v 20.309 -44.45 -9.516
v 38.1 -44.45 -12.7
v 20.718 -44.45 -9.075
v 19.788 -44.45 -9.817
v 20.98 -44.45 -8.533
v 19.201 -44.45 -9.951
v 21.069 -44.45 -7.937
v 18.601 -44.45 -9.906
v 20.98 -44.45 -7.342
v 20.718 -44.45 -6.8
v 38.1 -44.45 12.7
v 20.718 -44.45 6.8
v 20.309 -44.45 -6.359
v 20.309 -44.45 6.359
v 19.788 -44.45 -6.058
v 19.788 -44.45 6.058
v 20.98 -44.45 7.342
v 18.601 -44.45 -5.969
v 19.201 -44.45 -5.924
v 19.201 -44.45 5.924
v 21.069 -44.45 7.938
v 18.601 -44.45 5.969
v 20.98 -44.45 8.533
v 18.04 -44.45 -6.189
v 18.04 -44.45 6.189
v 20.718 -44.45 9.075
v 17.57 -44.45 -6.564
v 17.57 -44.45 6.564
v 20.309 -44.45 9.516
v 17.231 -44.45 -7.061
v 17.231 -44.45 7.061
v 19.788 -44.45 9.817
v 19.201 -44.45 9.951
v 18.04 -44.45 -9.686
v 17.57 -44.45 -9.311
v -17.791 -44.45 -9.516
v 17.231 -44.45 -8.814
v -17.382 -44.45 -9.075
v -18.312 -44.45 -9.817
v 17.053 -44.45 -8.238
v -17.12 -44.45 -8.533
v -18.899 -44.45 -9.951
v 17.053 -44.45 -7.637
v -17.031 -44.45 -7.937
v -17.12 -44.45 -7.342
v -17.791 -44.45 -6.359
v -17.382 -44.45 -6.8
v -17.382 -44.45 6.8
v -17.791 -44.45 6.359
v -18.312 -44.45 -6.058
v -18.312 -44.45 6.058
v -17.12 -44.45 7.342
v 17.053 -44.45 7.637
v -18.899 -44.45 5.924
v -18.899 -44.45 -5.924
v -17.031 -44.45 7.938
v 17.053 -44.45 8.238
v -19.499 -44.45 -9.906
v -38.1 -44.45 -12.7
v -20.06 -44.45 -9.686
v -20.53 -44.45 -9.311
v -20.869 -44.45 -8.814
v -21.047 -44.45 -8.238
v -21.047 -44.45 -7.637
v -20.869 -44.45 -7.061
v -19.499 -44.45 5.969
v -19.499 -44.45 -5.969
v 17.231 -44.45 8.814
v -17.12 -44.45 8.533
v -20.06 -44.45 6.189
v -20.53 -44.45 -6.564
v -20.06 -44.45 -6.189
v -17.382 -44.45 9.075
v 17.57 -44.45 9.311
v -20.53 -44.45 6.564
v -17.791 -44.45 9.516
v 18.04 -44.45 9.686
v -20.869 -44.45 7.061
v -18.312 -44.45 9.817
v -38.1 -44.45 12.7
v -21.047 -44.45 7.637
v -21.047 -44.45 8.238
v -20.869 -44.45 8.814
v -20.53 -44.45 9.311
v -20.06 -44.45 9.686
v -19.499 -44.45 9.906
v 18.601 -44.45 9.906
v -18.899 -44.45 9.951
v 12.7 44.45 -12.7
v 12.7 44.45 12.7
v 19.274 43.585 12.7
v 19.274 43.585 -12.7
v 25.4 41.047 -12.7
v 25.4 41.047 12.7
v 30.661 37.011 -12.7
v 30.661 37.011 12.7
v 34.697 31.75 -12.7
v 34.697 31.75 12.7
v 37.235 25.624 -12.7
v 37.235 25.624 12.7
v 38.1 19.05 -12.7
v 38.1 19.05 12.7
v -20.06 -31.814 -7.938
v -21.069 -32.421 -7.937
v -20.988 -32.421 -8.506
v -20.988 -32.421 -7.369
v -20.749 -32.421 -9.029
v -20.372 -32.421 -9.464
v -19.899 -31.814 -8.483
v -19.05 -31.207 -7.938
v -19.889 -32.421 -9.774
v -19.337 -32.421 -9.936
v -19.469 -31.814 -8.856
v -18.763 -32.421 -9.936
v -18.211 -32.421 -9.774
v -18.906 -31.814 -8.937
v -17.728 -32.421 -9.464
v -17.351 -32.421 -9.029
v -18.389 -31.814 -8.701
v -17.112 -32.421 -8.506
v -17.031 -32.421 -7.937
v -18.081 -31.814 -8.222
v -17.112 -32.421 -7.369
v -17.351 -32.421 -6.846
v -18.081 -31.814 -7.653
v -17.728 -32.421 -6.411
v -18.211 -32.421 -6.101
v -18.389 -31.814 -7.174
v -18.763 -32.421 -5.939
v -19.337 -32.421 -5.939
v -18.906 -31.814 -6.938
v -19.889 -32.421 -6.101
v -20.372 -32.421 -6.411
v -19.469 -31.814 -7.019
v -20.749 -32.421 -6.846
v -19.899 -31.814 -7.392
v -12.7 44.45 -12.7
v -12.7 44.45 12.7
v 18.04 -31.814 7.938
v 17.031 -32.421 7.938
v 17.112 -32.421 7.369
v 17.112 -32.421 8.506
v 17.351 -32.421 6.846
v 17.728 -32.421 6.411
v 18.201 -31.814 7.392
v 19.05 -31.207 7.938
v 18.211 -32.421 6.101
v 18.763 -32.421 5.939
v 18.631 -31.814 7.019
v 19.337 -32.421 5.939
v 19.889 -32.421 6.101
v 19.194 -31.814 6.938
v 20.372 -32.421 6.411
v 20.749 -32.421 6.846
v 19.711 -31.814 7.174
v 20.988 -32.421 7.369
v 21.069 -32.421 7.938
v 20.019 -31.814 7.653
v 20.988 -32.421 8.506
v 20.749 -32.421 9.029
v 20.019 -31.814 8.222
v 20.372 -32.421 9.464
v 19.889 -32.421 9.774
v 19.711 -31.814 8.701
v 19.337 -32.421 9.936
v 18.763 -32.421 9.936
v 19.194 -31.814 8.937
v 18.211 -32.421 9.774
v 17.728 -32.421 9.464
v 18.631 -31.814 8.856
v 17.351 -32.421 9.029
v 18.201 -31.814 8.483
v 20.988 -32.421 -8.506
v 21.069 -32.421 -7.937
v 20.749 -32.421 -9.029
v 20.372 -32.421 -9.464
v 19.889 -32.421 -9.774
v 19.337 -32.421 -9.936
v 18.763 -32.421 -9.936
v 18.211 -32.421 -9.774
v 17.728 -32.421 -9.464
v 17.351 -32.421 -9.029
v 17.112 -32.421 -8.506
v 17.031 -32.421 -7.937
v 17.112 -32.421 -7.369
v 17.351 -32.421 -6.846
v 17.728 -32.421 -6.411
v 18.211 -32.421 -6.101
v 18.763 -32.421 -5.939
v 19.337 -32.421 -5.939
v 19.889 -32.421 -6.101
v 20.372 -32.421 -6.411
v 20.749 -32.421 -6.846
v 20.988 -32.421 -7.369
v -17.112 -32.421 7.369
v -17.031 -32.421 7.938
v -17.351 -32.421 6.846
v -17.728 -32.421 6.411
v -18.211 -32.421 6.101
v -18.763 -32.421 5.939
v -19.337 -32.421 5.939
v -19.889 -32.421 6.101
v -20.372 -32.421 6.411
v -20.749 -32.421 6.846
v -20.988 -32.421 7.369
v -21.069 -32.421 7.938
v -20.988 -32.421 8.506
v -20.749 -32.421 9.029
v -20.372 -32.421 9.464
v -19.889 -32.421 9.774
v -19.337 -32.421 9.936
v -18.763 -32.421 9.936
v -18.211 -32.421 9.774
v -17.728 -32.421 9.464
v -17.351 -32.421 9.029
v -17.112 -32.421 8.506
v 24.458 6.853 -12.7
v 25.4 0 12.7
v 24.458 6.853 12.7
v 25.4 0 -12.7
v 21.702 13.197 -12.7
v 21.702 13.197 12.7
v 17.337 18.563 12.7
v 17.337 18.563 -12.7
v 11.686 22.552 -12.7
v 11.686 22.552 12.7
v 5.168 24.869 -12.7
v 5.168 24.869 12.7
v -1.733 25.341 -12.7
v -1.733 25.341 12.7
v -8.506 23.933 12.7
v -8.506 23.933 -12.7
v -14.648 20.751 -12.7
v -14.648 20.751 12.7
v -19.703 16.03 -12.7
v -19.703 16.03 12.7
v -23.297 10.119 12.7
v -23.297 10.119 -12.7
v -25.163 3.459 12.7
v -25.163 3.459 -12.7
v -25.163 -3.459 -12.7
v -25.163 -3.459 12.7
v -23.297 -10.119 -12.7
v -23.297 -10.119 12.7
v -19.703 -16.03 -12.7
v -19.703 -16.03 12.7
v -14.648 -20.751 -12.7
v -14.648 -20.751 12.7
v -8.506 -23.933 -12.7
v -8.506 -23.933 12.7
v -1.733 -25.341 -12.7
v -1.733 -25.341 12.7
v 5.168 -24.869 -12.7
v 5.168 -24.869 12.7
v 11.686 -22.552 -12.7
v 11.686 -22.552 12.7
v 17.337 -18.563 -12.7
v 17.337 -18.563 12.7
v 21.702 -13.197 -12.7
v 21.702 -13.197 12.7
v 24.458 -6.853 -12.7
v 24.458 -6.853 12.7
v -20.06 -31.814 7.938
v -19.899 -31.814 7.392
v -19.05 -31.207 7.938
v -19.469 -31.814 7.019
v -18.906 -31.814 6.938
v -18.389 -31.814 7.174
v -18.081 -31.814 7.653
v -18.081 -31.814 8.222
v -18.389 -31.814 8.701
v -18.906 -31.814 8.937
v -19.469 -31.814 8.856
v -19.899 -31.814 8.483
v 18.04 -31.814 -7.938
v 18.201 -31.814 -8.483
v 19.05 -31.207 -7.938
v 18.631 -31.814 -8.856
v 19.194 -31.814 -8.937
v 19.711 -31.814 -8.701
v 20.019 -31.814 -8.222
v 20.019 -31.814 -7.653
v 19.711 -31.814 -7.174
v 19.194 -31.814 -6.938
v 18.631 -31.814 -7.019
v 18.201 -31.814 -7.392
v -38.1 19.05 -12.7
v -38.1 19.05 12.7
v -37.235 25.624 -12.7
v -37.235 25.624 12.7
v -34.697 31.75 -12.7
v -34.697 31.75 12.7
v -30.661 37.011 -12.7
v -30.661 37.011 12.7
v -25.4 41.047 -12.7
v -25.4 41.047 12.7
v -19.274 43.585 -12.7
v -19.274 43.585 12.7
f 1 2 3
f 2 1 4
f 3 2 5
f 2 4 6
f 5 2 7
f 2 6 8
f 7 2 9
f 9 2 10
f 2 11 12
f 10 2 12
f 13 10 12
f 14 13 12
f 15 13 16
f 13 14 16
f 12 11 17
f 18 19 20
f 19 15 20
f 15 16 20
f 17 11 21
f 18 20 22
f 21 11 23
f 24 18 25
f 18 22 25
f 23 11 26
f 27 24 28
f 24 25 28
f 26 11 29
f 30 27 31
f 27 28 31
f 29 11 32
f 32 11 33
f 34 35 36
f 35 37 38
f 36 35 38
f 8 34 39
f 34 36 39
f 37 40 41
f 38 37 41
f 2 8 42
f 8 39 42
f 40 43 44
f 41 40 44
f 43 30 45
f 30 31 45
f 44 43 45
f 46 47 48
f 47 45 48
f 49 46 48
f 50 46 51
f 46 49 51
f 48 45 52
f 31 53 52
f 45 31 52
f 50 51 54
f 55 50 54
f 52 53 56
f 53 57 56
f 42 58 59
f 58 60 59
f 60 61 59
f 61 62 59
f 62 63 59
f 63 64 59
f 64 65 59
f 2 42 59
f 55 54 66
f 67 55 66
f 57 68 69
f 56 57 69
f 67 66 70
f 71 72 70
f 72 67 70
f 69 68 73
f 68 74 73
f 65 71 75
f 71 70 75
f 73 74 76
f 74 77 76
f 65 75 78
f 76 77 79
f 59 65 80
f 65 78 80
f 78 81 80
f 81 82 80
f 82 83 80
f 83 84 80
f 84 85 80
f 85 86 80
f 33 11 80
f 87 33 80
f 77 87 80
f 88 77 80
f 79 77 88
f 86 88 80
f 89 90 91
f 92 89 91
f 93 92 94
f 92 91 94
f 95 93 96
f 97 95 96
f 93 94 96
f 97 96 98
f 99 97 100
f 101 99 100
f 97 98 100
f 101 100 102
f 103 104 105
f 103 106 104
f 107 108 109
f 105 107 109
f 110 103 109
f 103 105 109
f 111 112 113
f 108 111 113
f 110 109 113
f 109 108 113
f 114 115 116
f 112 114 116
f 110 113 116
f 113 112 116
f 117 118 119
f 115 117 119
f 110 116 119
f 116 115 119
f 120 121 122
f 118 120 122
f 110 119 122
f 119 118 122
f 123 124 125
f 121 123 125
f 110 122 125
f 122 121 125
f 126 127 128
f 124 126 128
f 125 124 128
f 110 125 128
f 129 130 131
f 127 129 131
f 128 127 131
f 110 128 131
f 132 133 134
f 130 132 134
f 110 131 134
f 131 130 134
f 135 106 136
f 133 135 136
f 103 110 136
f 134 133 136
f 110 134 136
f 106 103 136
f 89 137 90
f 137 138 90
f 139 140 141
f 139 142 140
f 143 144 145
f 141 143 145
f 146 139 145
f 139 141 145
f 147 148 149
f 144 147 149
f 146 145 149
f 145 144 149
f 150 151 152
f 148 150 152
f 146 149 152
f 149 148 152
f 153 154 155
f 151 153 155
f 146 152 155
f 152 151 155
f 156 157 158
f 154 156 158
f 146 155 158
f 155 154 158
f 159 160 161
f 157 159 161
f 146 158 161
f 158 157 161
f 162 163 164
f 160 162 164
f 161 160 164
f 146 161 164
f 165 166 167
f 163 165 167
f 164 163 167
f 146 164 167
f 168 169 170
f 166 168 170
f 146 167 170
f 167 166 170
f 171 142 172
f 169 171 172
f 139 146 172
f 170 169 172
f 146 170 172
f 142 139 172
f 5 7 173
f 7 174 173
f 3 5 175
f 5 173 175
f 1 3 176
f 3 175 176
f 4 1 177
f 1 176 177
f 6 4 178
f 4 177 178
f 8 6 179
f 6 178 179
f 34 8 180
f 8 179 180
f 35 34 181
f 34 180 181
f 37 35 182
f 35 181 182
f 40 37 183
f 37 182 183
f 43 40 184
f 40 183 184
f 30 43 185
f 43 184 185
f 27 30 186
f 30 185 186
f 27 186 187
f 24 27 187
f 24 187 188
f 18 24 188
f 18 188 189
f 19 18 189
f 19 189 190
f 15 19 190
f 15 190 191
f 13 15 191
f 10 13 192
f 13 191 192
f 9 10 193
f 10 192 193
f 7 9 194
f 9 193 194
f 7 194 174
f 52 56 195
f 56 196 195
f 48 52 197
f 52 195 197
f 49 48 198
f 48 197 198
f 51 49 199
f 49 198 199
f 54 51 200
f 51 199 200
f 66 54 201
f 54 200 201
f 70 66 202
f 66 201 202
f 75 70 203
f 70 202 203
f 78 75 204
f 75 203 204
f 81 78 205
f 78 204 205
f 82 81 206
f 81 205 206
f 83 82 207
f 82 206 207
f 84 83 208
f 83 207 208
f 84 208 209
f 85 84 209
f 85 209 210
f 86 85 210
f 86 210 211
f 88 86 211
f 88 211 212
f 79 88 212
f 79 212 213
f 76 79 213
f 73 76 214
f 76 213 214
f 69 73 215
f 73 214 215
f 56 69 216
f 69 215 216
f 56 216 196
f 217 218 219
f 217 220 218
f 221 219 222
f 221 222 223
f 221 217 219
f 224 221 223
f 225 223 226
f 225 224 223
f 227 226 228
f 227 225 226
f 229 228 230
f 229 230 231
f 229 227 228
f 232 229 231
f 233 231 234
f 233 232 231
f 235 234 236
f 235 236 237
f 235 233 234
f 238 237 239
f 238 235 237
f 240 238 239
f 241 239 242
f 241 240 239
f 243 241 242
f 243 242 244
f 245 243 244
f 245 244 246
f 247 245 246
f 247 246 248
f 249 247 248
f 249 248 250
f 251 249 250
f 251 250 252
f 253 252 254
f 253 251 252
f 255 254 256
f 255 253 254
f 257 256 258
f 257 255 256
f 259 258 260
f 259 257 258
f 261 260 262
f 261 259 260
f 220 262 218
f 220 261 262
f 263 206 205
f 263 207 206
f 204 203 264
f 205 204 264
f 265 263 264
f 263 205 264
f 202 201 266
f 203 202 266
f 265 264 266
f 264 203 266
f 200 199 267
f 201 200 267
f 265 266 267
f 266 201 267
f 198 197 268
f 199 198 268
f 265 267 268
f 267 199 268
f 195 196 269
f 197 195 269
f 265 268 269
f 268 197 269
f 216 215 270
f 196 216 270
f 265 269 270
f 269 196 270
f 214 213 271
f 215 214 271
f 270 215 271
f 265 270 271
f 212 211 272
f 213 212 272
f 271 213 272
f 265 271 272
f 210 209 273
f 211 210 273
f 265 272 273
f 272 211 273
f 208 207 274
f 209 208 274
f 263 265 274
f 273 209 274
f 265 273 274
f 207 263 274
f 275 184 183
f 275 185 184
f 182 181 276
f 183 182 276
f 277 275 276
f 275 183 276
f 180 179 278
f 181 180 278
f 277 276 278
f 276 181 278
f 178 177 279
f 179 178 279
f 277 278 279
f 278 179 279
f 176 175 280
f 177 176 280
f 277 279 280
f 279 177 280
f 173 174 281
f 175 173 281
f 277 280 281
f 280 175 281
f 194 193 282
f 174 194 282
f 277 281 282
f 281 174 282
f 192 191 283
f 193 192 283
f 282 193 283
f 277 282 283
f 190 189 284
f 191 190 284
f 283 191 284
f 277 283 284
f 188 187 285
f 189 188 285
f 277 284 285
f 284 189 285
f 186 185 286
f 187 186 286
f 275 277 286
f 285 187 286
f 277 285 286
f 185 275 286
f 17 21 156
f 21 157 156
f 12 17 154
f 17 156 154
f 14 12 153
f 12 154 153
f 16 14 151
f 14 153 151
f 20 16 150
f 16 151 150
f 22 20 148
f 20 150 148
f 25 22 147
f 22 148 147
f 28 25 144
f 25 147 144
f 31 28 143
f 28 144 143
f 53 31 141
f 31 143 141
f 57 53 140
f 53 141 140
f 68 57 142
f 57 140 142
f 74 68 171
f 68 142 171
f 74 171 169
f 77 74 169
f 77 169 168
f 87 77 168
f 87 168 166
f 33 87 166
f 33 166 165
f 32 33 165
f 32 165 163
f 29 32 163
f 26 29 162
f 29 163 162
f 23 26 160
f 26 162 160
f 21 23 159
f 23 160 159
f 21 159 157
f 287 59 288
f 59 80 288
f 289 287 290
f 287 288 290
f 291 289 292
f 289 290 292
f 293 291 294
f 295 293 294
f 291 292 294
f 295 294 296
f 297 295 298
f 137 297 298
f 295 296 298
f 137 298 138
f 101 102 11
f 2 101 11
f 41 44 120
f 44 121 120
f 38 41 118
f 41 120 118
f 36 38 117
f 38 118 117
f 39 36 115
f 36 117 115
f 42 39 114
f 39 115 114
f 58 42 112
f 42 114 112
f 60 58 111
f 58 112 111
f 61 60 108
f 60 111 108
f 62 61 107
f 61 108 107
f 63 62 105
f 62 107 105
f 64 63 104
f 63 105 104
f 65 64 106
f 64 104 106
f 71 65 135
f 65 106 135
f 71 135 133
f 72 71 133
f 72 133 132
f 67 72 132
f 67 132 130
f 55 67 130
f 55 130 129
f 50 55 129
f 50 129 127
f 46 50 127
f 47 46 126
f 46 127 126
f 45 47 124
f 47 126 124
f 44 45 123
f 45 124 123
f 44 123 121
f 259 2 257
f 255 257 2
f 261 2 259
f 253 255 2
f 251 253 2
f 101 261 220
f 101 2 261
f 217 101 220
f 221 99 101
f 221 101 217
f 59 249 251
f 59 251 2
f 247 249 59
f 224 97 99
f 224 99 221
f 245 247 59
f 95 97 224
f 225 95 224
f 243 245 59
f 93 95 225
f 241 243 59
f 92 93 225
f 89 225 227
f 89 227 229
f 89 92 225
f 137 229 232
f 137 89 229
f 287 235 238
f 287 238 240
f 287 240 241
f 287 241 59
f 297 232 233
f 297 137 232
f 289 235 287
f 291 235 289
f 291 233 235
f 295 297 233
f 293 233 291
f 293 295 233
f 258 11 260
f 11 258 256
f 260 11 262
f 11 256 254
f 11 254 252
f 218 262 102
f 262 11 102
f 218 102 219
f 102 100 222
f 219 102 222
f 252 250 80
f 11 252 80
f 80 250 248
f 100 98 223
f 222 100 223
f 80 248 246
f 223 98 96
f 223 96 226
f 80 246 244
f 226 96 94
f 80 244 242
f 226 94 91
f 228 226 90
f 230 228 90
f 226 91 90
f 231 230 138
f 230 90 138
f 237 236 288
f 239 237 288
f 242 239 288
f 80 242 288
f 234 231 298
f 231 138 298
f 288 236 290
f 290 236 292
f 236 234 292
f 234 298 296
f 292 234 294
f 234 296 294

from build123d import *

# Parameters (mm, degrees)
SKETCH1_R                  = 25.4
BOSS_EXTRUDE1_DEPTH        = 12.7
F_10_32_TAPPED_HOLE1_D     = 4.0386
F_10_32_TAPPED_HOLE1_DEPTH = 12.02944
F_10_32_TAPPED_HOLE1_TIP   = 1.213317848


with BuildPart() as part:
    # Sketch1 → Boss-Extrude1 (new body, symmetric)
    with BuildSketch(Plane.XY):
        with BuildLine():
            Line((38.1, -44.45), (-38.1, -44.45))
            Line((-38.1, -44.45), (-38.1, 19.05))
            ThreePointArc((-38.1, 19.05), (-30.660512242, 37.010512242), (-12.7, 44.45))
            Line((-12.7, 44.45), (12.7, 44.45))
            ThreePointArc((12.7, 44.45), (30.660512242, 37.010512242), (38.1, 19.05))
            Line((38.1, 19.05), (38.1, -44.45))
        make_face()
        Circle(SKETCH1_R, mode=Mode.SUBTRACT)
    extrude(amount=BOSS_EXTRUDE1_DEPTH, both=True)

    # #10-32 Tapped Hole1
    with Locations(Plane(origin=(0, -44.45, 0), x_dir=(-1, 0, 0), z_dir=(0, -1, 0))):
        with Locations((19.05, -7.9375), (-19.05, -7.9375), (-19.05, 7.9375), (19.05, 7.9375)):
            Hole(F_10_32_TAPPED_HOLE1_D / 2, depth=F_10_32_TAPPED_HOLE1_DEPTH)
            with Locations((0, 0, -(F_10_32_TAPPED_HOLE1_DEPTH + F_10_32_TAPPED_HOLE1_TIP / 2))):  # 118° drill point
                Cone(0, F_10_32_TAPPED_HOLE1_D / 2, F_10_32_TAPPED_HOLE1_TIP, mode=Mode.SUBTRACT)


solid = part.part
